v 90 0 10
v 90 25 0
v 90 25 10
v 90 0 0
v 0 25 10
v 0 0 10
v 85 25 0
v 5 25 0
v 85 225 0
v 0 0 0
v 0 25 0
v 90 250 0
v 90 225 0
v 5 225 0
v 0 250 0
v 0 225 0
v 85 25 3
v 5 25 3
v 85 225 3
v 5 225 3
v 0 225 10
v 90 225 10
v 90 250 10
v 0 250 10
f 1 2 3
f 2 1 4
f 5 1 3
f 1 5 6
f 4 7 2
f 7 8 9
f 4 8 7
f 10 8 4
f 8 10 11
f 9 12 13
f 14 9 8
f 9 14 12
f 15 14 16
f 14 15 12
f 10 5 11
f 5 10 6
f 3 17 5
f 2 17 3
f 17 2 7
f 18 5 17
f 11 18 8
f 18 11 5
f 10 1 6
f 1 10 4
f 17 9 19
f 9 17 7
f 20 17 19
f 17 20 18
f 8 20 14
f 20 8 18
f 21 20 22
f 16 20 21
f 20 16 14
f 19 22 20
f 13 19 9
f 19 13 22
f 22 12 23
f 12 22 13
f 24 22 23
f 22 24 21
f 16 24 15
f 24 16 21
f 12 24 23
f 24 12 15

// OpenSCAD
// PCIe Riser Cable Model
// Flexible ribbon cable for vertical GPU mounting

module pcie_riser(length = 200) {
    // Connector dimensions (PCIe x16)
    connector_length = 90;
    connector_width = 25;
    connector_height = 10;

    // Cable dimensions
    cable_width = 80;
    cable_thickness = 3;

    union() {
        // Motherboard-side connector
        color("black") {
            cube([connector_length, connector_width, connector_height]);
        }

        // Flexible cable (simplified as curved path)
        color("orange") {
            translate([connector_length/2 - cable_width/2, connector_width, 0]) {
                cube([cable_width, length, cable_thickness]);
            }
        }

        // GPU-side connector
        color("black") {
            translate([0, connector_width + length, 0]) {
                cube([connector_length, connector_width, connector_height]);
            }
        }
    }
}

// Preview
pcie_riser();
